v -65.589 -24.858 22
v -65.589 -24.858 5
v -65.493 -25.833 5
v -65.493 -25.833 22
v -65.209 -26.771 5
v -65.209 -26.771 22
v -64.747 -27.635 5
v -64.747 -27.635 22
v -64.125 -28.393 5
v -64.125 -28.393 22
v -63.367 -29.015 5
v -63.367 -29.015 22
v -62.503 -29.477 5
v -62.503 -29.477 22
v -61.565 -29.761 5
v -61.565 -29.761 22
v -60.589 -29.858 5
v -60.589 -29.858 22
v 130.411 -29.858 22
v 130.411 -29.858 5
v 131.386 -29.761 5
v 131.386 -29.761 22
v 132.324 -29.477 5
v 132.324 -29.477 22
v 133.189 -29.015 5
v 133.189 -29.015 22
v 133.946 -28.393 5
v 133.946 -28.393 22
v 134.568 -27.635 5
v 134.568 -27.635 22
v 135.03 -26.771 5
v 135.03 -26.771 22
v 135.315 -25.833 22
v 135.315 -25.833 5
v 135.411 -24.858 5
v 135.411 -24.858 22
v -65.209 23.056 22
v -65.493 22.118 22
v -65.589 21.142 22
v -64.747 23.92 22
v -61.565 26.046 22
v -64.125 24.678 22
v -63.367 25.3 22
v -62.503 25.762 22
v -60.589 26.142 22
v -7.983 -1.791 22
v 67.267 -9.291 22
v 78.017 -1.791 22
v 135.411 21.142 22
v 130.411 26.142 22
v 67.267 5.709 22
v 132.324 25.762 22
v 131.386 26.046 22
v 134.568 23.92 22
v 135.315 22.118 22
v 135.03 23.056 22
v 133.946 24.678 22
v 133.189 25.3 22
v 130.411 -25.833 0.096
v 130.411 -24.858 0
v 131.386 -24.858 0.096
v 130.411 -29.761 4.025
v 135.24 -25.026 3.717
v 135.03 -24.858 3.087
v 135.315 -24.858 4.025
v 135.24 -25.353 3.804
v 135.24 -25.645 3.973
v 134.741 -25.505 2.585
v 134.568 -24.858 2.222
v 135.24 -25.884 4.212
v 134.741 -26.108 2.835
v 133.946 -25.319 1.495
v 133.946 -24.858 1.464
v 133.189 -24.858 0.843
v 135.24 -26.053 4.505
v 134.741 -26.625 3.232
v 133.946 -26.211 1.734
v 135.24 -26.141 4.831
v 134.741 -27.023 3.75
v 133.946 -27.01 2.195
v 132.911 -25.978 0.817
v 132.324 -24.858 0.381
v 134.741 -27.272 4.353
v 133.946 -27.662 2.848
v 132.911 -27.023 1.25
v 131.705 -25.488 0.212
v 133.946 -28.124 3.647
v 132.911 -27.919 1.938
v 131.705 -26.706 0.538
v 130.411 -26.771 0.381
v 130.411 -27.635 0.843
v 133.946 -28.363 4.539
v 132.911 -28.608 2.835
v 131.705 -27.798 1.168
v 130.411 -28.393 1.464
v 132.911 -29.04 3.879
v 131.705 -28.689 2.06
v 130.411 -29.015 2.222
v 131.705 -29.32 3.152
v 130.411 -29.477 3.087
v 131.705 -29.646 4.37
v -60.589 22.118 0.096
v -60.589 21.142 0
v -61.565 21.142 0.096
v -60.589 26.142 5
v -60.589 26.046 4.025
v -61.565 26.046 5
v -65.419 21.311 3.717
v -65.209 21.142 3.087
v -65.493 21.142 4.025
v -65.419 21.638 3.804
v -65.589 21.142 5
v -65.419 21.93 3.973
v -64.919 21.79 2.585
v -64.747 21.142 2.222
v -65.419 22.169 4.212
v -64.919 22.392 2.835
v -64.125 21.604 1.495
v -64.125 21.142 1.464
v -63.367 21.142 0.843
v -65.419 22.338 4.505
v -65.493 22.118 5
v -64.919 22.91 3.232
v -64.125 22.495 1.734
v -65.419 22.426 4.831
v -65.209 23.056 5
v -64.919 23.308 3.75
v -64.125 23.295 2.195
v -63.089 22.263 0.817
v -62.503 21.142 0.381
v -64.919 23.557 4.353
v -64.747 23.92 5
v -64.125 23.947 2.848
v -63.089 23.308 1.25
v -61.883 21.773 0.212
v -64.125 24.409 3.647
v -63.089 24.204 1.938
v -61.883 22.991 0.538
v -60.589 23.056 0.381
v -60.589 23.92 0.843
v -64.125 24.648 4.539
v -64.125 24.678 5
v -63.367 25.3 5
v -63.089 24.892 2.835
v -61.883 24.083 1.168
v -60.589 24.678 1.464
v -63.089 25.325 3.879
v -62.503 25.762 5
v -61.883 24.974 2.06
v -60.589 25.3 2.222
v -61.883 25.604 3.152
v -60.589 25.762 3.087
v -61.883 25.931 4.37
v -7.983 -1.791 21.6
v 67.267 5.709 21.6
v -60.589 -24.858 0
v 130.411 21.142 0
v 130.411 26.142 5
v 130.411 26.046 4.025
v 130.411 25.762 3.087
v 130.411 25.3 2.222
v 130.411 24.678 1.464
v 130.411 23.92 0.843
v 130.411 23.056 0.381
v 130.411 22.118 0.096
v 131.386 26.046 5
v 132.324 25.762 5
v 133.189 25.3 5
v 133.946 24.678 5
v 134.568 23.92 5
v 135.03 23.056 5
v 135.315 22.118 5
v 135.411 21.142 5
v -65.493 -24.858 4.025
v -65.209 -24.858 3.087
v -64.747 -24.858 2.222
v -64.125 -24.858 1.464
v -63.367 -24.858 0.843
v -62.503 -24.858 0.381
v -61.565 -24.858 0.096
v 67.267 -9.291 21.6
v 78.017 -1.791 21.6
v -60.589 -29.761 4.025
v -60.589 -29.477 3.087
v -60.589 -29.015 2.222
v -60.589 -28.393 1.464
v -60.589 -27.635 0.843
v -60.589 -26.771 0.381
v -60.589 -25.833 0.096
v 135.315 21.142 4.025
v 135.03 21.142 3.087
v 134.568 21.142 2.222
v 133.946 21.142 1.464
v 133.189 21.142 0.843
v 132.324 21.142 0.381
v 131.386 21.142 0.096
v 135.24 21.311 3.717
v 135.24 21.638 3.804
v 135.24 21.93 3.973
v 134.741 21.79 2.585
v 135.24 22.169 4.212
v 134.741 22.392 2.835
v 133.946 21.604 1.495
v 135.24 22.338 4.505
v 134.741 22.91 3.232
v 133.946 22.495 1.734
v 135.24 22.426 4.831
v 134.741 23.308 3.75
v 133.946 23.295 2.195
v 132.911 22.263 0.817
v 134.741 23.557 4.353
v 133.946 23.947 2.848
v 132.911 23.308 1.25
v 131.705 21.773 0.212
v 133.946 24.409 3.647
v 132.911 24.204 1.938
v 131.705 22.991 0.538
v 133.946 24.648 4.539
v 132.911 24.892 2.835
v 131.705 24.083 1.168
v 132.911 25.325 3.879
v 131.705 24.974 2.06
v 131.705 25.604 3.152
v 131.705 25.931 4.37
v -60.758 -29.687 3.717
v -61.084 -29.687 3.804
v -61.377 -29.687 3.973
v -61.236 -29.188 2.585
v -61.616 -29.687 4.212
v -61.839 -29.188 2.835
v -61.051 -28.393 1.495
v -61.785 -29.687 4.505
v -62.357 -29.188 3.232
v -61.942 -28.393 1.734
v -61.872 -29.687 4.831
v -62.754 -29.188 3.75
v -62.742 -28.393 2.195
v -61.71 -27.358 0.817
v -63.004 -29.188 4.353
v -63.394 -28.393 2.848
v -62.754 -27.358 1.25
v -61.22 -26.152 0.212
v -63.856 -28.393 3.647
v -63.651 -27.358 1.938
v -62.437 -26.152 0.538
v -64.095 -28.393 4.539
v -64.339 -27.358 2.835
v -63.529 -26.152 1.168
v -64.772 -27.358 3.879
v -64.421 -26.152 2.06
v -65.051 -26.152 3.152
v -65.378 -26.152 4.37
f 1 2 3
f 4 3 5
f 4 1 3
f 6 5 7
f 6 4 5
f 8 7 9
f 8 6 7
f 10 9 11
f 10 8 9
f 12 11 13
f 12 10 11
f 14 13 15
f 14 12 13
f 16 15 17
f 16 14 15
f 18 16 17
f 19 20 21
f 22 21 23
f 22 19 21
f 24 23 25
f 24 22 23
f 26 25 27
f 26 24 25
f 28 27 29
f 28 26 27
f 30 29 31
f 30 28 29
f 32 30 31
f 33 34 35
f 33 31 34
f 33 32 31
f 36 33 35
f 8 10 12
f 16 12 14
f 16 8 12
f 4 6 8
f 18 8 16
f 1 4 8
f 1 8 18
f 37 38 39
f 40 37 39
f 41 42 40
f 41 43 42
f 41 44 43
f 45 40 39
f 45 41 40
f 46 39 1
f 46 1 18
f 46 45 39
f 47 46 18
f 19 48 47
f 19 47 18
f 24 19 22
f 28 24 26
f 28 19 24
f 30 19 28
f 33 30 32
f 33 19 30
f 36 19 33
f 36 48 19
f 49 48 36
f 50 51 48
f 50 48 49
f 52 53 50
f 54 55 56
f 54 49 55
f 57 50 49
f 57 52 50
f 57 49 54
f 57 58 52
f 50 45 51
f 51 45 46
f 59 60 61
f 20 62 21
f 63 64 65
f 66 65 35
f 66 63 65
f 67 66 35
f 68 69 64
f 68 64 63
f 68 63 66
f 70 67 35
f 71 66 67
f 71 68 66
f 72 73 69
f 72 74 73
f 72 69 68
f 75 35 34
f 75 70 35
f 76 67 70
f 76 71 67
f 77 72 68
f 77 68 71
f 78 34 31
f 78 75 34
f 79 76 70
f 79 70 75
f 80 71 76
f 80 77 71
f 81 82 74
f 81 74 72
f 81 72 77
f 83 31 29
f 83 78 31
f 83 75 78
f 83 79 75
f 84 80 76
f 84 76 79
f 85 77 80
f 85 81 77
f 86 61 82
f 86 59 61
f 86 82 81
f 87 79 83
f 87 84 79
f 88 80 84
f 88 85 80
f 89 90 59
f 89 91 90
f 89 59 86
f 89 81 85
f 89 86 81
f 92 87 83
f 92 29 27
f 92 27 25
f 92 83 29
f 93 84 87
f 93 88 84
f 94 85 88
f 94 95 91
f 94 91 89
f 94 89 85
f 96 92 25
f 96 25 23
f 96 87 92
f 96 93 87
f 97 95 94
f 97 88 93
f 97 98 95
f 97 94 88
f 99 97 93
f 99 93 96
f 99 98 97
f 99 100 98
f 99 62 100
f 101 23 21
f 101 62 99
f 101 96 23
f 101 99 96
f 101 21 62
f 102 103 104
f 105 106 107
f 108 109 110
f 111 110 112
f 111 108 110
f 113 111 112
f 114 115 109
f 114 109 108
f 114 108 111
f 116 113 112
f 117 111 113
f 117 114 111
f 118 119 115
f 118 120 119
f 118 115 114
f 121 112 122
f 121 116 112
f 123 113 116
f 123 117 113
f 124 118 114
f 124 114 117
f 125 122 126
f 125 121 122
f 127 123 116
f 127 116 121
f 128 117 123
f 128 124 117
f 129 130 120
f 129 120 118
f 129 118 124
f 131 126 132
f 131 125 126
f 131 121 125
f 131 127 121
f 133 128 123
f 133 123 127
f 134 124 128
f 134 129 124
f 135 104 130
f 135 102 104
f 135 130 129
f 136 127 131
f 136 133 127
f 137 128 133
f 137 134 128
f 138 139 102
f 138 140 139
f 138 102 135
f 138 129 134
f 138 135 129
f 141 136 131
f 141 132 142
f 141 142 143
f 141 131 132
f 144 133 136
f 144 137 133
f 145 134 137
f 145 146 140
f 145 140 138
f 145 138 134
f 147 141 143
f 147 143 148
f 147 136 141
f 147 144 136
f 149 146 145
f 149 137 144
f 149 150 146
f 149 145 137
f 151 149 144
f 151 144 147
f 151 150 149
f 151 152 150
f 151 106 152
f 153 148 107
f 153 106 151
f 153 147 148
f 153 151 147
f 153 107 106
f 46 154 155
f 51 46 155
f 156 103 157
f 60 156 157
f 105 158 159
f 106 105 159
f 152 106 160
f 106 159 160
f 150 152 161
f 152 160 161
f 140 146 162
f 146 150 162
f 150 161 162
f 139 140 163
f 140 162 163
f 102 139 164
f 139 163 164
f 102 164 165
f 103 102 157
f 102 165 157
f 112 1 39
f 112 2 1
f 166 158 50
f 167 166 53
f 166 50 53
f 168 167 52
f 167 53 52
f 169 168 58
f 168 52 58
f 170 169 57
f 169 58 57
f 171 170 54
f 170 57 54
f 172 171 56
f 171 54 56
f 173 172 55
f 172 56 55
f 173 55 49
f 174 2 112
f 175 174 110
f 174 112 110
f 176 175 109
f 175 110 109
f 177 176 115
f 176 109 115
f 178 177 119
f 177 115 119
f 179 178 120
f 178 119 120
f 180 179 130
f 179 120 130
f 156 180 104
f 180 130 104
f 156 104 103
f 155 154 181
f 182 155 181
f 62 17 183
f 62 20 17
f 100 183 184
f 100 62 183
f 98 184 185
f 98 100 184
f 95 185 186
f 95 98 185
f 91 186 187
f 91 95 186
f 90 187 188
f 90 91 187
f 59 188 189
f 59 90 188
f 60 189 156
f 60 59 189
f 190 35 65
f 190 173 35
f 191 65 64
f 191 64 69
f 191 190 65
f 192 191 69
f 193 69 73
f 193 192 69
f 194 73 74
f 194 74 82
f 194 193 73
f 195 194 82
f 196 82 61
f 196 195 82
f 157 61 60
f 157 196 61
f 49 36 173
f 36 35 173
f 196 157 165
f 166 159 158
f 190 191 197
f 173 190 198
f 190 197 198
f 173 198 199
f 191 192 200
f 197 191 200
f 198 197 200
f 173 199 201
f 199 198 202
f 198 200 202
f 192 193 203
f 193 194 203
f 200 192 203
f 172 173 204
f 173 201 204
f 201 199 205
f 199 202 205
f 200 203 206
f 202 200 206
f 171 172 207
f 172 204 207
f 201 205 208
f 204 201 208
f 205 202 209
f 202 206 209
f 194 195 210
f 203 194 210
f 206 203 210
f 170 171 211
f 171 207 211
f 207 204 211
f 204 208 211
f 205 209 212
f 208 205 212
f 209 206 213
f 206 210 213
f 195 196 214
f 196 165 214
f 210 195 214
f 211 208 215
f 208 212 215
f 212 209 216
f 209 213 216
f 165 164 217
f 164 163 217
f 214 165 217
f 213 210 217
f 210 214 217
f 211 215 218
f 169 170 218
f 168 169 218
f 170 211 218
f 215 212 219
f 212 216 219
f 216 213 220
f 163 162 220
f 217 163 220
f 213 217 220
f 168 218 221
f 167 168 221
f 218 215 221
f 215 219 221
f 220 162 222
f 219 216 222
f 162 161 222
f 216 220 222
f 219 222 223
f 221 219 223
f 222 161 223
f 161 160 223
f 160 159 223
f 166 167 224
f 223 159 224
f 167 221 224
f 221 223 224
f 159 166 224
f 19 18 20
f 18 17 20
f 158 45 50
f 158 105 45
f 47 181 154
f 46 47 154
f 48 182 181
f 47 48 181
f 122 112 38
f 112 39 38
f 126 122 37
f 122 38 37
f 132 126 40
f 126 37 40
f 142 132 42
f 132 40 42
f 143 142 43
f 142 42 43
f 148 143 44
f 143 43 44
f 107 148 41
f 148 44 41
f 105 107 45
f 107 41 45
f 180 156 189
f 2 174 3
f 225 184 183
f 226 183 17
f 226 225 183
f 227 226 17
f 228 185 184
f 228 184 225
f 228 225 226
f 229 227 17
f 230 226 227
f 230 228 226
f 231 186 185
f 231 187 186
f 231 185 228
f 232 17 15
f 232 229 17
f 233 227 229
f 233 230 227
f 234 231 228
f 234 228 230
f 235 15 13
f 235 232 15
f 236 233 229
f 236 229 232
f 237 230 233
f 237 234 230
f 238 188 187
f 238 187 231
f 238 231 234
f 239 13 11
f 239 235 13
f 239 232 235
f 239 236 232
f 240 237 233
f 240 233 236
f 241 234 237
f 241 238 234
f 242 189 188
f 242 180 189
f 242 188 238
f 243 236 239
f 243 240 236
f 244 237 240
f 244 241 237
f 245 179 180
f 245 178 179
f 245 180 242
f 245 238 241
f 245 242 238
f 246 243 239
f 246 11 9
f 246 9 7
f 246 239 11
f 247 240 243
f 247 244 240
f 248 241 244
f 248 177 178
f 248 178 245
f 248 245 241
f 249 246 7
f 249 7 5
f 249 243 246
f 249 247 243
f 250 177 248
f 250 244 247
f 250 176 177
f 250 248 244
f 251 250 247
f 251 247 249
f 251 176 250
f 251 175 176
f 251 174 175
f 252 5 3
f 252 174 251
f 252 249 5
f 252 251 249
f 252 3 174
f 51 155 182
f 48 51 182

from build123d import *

# Parameters (mm, degrees)
F0_W     = 201
F0_H     = 56
F1_DEPTH = 22
F2_R     = 5
F3_DEPTH = 21.6


with BuildPart() as f1:
    # F0 (on Top) → F1 (new body)
    with BuildSketch(Plane.XY):
        with Locations((34.910782, -1.85752)):
            Rectangle(F0_W, F0_H)
        Polygon((67.267462, -9.29118), (-7.982538, -1.79118), (67.267462, 5.70882), (78.017462, -1.79118), align=None, mode=Mode.SUBTRACT)
    extrude(amount=F1_DEPTH)

    # F2
    f2_edges = [f1.edges().sort_by_distance(p)[0] for p in [
        (34.910782, 26.14248, 0),
        (-65.589218, -1.85752, 0),
        (34.910782, -29.85752, 0),
        (135.410782, -1.85752, 0),
        (135.410782, 26.14248, 11),
        (-65.589218, 26.14248, 11),
        (-65.589218, -29.85752, 11),
        (135.410782, -29.85752, 11),
    ]]
    fillet(f2_edges, radius=F2_R)

    # F0 (on Top) → F3 (join)
    with BuildSketch(Plane.XY):
        Polygon((67.267462, 5.70882), (-7.982538, -1.79118), (67.267462, -9.29118), (78.017462, -1.79118), align=None)
    extrude(amount=F3_DEPTH)


solid = f1.part
